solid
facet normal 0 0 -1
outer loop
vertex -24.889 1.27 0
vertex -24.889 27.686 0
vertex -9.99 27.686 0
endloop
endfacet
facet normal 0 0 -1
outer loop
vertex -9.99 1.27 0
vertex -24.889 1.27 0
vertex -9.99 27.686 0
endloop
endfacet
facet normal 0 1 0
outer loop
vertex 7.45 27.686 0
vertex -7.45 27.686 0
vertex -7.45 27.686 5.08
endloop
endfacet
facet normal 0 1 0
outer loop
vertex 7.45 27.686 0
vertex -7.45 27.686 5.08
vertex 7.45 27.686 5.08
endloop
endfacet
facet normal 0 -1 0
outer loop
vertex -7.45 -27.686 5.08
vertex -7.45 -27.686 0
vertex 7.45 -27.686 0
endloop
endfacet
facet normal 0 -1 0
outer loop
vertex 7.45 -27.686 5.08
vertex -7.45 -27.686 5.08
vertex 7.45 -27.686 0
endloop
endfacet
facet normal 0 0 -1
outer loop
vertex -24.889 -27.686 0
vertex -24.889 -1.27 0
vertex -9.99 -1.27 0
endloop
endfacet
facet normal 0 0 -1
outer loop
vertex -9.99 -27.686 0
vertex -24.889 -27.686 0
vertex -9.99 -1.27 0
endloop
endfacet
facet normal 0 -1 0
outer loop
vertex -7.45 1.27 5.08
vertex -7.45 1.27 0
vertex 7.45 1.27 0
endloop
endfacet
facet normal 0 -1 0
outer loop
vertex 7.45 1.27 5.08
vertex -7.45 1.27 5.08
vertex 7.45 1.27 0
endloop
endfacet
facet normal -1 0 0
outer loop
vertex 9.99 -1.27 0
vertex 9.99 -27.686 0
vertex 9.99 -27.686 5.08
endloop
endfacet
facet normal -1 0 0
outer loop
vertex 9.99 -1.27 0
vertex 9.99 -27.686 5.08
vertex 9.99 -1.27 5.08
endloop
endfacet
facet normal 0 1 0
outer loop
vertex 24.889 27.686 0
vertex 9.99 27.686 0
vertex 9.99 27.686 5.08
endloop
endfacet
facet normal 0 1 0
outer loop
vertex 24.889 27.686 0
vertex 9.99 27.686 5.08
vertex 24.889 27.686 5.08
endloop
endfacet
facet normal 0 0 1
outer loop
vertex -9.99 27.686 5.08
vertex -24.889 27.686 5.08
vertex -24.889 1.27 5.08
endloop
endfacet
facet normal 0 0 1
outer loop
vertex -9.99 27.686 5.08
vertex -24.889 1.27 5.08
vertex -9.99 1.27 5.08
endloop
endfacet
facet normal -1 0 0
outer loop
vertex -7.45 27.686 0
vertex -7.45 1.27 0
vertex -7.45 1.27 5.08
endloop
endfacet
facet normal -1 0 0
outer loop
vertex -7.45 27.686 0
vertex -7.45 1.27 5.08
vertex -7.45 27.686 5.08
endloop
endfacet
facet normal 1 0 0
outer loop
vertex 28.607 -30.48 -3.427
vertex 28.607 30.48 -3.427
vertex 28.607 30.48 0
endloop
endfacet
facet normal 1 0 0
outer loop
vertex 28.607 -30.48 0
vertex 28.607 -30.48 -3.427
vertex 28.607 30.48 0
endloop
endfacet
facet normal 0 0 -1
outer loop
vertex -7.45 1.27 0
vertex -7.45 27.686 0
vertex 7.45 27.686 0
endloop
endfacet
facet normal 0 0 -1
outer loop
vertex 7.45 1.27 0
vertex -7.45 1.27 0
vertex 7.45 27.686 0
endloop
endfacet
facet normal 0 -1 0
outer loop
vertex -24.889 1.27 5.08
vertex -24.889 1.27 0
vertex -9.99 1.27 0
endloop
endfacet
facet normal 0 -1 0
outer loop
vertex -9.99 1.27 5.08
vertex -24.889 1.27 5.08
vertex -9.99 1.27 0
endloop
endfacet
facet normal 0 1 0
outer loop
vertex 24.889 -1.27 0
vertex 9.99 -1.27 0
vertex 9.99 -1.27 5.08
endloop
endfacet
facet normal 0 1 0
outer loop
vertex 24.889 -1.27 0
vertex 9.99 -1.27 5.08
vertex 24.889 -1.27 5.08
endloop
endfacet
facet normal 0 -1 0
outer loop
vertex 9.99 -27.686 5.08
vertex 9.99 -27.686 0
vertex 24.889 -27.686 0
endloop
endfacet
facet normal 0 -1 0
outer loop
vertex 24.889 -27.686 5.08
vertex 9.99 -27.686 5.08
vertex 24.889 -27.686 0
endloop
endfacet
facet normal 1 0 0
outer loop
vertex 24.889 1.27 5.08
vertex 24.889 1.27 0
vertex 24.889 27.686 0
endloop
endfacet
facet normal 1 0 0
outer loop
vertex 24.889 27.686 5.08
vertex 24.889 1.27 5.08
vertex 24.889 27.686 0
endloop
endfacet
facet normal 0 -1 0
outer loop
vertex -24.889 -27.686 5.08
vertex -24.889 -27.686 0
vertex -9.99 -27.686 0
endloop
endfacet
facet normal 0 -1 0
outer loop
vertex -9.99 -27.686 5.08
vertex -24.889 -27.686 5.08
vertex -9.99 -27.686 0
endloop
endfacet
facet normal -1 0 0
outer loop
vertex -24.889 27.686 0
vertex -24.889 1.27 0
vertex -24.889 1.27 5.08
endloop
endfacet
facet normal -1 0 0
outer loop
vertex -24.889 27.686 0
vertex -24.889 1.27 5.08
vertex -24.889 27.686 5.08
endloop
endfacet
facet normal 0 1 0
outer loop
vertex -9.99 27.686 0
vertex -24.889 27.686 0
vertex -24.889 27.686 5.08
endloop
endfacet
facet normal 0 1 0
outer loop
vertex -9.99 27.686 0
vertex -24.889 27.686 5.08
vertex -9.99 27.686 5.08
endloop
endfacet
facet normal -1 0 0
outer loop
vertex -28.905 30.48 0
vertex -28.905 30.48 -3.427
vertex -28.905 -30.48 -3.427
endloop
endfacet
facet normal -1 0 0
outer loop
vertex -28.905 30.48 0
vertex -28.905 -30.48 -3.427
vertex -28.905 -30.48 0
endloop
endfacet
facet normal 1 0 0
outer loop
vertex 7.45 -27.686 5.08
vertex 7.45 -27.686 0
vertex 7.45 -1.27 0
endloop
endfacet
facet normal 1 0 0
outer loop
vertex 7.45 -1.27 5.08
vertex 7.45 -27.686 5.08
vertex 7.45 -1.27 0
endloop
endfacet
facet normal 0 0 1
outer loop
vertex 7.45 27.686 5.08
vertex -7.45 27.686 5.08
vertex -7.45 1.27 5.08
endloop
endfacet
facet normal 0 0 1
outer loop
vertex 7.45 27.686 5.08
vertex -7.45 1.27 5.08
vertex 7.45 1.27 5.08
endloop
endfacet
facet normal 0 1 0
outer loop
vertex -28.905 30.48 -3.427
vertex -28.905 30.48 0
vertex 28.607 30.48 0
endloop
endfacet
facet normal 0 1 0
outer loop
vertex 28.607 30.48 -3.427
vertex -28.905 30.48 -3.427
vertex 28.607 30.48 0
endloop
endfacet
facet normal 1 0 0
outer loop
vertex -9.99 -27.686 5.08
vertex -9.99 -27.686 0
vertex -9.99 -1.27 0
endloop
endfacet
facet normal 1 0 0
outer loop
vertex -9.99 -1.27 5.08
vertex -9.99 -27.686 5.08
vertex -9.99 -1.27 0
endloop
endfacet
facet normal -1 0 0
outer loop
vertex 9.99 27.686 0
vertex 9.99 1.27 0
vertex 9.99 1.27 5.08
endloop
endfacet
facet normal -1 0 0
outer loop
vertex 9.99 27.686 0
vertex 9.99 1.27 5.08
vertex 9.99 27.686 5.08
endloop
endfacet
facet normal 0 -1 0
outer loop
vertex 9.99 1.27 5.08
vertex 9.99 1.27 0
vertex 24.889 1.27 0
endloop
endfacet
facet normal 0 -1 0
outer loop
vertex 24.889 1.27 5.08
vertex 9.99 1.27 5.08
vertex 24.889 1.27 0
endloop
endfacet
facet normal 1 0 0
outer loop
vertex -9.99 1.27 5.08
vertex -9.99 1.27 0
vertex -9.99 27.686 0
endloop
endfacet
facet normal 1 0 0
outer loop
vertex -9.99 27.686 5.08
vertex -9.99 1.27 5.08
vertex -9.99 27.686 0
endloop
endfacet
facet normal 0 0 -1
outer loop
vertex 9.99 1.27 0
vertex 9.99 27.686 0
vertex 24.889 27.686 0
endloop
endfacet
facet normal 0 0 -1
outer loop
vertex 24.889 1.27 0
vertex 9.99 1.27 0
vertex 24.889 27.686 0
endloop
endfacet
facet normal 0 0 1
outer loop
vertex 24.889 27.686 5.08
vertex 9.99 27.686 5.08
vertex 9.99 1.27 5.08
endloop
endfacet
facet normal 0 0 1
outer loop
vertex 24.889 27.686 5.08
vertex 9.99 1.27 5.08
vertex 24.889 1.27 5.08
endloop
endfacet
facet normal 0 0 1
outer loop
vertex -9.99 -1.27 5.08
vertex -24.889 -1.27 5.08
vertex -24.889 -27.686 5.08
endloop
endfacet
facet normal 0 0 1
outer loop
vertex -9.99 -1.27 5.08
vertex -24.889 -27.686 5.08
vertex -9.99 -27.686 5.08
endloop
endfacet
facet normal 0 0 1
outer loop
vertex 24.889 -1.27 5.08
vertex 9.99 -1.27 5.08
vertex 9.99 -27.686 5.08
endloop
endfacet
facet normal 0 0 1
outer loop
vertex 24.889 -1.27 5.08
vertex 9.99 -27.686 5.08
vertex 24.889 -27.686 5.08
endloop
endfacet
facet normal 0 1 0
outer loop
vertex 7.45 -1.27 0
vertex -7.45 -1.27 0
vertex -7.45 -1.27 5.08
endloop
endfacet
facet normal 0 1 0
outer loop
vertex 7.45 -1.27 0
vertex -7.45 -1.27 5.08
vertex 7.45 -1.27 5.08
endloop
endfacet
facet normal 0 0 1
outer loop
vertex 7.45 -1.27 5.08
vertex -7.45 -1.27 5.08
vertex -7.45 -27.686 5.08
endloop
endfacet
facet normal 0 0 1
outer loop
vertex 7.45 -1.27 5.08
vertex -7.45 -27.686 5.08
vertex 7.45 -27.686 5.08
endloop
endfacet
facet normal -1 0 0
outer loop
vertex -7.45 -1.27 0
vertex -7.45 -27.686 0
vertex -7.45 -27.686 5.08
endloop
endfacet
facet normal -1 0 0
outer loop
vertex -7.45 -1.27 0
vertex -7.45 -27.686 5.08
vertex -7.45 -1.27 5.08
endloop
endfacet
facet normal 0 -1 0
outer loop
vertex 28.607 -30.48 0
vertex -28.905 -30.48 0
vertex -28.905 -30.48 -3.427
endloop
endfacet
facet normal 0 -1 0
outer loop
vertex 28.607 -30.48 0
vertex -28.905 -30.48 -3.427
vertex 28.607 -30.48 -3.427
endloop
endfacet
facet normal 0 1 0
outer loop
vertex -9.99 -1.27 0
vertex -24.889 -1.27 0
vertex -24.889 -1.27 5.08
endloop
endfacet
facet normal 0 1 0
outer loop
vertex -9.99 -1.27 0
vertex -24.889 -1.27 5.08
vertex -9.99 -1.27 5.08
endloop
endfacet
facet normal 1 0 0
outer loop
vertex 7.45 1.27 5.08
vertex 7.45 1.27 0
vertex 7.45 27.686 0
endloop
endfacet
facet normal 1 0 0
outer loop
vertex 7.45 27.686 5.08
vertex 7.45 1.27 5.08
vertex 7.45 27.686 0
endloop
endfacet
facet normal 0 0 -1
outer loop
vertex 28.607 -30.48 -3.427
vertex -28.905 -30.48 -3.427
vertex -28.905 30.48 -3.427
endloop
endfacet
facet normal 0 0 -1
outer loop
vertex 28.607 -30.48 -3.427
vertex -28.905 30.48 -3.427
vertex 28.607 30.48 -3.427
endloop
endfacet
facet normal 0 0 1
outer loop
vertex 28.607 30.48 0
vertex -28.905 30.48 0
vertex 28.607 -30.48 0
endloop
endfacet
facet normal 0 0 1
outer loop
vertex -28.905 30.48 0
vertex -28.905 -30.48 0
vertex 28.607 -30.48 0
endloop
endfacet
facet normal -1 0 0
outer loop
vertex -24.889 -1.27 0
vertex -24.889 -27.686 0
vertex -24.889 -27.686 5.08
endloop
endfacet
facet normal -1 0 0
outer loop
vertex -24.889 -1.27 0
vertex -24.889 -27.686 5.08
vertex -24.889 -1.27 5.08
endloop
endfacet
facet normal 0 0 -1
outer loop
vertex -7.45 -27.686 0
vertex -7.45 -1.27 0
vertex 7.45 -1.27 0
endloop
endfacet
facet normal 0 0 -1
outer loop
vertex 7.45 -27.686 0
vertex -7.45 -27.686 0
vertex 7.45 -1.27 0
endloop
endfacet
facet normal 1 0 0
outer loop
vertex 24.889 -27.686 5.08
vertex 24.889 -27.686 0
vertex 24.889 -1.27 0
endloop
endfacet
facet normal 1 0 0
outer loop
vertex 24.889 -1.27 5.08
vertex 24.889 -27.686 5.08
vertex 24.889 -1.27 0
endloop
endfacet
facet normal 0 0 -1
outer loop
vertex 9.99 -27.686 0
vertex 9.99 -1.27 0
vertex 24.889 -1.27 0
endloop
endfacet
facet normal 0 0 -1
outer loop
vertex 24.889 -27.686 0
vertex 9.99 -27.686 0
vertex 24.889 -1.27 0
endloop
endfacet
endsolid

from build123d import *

# Parameters (mm, degrees)
F0_W     = 14.899441
F0_H     = 26.416
F1_DEPTH = 5.08
F2_W     = 57.511846
F2_H     = 3.426872
F3_DEPTH = 30.48


with BuildPart() as f1:
    # F0 (on Top) → F1 (new body)
    with BuildSketch(Plane.XY):
        with Locations((-17.439439, 14.478)):
            Rectangle(F0_W, F0_H)
        with Locations((2e-06, 14.478)):
            Rectangle(F0_W, F0_H)
        with Locations((17.439443, 14.478)):
            Rectangle(F0_W, F0_H)
        with Locations((17.439443, -14.478)):
            Rectangle(F0_W, F0_H)
        with Locations((2e-06, -14.478)):
            Rectangle(F0_W, F0_H)
        with Locations((-17.439439, -14.478)):
            Rectangle(F0_W, F0_H)
    extrude(amount=F1_DEPTH)


with BuildPart() as f3:
    # F2 (on Front) → F3 (new body, symmetric)
    with BuildSketch(Plane.XZ):
        with Locations((-0.148992, -1.713436)):
            Rectangle(F2_W, F2_H)
    extrude(amount=F3_DEPTH, both=True)


solid = Compound([f1.part, f3.part])
